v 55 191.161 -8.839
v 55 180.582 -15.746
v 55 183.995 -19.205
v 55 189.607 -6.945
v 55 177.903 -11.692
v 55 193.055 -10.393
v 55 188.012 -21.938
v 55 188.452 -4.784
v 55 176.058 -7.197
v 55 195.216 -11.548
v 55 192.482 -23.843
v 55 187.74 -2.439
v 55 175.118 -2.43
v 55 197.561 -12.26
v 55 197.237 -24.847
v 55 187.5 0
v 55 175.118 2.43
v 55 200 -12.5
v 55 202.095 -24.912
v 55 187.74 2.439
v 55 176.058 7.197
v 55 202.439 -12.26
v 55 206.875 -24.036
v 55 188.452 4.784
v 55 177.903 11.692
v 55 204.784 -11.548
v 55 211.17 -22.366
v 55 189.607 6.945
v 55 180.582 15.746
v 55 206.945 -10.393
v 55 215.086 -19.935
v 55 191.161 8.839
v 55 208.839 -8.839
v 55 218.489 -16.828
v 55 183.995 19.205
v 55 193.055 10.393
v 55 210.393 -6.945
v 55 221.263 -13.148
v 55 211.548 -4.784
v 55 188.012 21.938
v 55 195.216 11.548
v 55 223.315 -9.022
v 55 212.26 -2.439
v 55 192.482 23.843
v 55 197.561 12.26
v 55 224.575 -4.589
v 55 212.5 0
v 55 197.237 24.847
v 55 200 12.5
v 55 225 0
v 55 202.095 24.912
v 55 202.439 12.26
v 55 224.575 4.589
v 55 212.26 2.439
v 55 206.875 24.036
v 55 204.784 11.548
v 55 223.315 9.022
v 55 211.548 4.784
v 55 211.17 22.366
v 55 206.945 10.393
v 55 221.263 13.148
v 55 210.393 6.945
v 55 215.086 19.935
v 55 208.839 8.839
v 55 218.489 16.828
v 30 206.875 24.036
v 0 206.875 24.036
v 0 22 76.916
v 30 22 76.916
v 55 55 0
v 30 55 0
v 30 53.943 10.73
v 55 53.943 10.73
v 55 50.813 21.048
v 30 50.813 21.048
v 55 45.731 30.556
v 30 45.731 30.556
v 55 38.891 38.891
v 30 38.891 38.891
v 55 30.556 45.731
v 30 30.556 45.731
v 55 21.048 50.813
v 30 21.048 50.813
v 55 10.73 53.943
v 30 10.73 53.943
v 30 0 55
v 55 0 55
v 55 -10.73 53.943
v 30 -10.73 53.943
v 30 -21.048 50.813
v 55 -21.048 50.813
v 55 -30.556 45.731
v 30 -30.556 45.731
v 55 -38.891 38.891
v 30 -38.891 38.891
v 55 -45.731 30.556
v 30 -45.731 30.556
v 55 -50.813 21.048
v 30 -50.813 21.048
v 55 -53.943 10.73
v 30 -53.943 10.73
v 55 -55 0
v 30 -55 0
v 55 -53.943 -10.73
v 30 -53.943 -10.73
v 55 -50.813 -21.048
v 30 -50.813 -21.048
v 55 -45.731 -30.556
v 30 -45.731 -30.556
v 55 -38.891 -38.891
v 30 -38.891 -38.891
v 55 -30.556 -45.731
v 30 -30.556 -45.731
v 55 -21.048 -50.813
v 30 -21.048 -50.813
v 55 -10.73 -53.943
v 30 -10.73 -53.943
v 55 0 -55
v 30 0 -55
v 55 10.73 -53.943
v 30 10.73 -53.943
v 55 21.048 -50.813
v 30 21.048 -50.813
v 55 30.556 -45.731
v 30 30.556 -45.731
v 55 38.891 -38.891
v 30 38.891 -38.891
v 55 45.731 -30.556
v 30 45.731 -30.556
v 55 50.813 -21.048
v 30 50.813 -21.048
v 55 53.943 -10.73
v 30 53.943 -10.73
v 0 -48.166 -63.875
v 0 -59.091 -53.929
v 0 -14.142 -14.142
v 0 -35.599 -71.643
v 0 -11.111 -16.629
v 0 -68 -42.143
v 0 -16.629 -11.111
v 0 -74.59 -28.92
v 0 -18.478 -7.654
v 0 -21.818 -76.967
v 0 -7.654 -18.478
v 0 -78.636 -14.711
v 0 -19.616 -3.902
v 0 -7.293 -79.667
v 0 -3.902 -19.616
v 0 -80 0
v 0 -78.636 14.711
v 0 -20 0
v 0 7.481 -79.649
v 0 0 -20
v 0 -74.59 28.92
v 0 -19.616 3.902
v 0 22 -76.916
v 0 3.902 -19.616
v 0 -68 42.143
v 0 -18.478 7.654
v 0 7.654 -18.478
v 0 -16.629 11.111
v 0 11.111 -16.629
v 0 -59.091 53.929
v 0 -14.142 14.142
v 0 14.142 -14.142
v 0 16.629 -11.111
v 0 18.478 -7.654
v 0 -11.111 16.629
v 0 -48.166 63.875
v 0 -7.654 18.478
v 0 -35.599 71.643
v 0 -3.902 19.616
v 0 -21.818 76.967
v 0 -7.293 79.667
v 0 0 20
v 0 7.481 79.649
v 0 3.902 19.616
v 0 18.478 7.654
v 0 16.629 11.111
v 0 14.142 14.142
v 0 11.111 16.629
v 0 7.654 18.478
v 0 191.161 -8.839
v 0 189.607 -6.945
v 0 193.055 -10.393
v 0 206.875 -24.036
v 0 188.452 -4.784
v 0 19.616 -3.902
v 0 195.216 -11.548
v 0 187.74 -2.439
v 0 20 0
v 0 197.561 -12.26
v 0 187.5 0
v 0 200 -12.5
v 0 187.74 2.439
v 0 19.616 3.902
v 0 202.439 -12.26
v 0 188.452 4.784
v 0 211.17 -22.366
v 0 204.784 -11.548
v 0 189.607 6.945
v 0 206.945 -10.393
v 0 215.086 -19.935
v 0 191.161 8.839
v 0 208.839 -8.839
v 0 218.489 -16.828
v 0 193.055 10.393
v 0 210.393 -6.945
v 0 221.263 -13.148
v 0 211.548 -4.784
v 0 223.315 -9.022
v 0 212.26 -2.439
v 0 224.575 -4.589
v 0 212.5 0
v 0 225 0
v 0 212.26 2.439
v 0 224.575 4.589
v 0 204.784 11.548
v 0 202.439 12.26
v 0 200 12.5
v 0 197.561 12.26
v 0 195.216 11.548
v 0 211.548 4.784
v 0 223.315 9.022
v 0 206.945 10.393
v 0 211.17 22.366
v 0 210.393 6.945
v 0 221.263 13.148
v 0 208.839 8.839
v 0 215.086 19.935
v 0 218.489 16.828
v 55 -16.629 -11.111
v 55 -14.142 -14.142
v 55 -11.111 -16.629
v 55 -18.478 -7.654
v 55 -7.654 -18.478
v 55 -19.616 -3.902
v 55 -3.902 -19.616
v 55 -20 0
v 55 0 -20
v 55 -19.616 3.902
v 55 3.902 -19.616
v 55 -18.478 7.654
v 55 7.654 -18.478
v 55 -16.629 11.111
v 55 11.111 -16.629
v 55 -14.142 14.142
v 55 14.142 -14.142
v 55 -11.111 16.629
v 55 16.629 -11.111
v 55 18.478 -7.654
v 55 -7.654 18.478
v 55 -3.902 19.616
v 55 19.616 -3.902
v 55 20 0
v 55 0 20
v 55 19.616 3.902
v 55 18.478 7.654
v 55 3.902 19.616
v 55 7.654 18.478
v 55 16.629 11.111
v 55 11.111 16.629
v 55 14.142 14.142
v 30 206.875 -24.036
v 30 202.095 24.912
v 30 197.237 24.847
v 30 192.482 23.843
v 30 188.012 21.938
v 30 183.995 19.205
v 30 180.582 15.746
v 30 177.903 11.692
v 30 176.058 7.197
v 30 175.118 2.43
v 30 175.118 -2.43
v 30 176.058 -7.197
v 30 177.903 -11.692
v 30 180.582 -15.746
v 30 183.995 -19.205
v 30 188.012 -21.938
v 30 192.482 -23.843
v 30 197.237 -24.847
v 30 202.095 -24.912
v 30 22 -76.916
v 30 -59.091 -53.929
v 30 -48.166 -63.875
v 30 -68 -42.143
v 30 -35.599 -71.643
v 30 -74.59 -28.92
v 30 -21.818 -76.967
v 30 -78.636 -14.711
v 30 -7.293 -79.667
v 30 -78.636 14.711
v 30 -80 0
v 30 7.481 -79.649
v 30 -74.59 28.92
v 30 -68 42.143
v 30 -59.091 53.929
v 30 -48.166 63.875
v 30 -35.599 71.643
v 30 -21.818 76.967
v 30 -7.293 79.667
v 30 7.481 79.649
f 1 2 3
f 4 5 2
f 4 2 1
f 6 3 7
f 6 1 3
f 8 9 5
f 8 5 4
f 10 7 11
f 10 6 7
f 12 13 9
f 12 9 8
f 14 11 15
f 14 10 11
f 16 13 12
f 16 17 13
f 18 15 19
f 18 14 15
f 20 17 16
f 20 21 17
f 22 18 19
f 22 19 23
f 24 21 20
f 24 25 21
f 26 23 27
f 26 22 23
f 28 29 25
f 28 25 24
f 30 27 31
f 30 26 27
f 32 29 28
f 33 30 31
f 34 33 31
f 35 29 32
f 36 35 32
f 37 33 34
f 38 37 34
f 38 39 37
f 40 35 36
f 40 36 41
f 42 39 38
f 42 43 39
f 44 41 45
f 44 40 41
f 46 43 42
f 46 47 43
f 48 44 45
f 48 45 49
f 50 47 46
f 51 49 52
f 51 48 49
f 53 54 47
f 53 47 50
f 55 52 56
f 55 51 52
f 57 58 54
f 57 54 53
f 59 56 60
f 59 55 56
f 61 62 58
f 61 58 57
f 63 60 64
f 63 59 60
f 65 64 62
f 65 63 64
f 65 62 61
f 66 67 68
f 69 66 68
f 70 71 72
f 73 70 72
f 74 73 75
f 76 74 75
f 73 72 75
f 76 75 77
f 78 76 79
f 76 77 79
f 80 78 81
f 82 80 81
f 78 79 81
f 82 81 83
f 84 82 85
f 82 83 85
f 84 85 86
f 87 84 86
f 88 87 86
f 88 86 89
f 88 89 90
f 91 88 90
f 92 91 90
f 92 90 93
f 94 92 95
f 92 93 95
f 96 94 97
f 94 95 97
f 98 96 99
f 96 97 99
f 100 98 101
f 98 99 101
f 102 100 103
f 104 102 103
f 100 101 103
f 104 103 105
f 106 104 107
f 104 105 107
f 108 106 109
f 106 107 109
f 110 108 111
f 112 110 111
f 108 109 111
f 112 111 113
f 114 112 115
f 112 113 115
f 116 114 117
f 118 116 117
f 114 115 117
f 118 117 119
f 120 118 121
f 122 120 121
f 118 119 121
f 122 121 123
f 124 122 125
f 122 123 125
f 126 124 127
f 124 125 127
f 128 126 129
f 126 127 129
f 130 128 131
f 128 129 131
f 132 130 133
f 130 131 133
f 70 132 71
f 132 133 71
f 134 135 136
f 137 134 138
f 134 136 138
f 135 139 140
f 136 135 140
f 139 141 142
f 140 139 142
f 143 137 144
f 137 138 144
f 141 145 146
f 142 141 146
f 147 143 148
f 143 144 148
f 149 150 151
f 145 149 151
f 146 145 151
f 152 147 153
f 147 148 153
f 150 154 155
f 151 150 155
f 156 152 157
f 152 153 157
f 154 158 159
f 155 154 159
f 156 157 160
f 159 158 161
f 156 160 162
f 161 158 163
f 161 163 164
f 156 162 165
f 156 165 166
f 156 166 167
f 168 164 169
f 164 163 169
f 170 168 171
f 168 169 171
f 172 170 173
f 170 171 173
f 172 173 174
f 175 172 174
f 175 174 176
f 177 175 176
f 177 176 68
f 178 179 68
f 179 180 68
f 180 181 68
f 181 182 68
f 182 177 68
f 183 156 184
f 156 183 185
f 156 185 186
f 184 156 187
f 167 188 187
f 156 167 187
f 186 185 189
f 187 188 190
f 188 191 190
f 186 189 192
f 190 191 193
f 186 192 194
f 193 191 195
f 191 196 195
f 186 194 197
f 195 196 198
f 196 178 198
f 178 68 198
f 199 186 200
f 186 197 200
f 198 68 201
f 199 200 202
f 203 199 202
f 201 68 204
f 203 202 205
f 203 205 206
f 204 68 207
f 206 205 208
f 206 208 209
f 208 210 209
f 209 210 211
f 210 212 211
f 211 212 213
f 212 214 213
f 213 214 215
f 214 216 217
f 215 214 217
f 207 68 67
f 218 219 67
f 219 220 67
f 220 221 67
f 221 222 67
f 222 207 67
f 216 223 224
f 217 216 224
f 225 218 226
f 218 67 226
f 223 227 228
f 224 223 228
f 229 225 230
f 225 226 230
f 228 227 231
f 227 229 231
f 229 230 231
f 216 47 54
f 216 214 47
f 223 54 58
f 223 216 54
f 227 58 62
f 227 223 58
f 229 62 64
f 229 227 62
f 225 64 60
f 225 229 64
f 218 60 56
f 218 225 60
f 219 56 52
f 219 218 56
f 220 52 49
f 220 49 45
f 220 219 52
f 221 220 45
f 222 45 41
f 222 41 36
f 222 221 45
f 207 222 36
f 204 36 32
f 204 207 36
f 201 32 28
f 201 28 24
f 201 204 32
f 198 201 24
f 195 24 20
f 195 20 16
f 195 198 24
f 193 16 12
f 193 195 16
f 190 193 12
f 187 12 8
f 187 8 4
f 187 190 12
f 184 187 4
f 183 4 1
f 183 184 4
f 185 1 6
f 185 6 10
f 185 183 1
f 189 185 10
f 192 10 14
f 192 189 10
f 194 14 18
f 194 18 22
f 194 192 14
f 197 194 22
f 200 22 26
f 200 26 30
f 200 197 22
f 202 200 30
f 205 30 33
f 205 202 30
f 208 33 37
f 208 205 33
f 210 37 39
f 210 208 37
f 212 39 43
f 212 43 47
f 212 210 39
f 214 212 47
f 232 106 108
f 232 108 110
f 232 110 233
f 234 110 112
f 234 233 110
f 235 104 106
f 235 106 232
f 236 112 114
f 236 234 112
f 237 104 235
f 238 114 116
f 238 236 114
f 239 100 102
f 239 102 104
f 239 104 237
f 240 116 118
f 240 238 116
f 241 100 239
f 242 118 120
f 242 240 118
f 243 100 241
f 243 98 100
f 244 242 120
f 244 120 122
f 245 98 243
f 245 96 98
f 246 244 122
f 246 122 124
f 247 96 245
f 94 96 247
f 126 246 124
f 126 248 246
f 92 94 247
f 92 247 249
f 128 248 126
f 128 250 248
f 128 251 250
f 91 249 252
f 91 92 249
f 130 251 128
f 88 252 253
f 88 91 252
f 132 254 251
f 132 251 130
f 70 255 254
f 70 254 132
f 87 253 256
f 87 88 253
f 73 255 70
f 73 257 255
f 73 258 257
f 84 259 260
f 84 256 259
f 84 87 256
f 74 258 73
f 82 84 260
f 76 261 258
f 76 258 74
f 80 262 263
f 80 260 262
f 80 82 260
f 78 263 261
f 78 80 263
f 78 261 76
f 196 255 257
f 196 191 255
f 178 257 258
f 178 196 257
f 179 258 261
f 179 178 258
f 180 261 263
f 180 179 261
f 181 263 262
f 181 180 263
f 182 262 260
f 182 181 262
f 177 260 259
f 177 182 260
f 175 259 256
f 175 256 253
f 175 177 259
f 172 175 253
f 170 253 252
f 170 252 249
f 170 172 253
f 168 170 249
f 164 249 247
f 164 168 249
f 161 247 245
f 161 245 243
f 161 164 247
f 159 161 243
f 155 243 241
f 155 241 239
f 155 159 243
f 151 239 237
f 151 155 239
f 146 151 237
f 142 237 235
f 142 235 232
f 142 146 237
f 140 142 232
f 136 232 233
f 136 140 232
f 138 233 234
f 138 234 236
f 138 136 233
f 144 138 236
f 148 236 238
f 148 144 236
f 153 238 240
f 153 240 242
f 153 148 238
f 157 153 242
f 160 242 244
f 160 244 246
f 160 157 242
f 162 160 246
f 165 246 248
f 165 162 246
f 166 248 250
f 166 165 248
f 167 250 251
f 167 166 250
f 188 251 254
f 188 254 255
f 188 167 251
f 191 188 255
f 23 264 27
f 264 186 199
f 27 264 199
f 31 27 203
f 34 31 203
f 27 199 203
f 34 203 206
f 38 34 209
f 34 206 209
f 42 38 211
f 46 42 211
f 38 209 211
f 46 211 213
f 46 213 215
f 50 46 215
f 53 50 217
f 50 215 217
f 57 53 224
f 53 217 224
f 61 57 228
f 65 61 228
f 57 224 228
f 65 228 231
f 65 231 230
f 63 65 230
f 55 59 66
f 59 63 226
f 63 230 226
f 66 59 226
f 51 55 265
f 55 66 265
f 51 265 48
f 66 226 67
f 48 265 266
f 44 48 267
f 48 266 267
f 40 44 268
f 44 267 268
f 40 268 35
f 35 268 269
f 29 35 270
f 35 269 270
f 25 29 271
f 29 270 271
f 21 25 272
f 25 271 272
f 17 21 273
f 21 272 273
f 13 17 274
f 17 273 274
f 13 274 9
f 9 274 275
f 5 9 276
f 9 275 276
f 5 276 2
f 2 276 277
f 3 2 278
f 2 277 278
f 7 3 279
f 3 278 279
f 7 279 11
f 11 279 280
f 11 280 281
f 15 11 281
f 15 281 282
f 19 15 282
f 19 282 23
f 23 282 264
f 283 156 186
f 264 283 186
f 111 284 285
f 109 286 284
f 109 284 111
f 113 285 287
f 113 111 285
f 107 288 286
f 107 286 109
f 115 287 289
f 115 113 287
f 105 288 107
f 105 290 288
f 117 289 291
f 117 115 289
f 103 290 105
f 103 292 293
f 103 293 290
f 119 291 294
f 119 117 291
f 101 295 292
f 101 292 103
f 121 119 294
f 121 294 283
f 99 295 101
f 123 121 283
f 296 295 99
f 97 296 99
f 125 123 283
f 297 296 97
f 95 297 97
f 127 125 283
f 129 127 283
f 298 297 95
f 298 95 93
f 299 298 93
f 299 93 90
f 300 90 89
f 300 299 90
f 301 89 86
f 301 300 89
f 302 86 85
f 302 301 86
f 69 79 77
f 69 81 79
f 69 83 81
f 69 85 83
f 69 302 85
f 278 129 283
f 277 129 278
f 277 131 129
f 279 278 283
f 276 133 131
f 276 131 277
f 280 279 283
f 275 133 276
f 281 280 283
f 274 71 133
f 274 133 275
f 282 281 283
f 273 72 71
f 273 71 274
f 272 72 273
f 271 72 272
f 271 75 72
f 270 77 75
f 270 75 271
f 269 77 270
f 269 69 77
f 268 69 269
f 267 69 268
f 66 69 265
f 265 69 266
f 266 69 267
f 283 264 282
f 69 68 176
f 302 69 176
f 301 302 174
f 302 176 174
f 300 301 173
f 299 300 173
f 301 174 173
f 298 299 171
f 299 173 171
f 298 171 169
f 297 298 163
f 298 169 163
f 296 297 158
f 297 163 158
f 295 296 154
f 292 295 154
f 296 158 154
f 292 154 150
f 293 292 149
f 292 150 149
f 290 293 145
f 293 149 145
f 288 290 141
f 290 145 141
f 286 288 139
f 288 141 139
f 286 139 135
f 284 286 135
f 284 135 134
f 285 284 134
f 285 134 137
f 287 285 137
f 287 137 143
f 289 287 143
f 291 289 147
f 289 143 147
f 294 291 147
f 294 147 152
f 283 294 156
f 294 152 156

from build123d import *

# Parameters (mm, degrees)
F0_R     = 20
F0_R_2   = 12.5
F1_DEPTH = 30
F2_R     = 55
F2_R_2   = 20
F3_DEPTH = 25
F4_R     = 12.5
F5_DEPTH = 25


with BuildPart() as f1:
    # F0 (on Right) → F1 (new body)
    with BuildSketch(Plane.YZ):
        with BuildLine():
            ThreePointArc((22, -76.9155380921), (63.8748776907, -48.1663783152), (80, 0))
            ThreePointArc((80, 0), (63.8748776907, 48.1663783152), (22, 76.9155380921))
            ThreePointArc((22, 76.9155380921), (-80, 0), (22, -76.9155380921))
        make_face()
        Circle(F0_R, mode=Mode.SUBTRACT)
        with BuildLine():
            ThreePointArc((22, 76.9155380921), (63.8748776907, 48.1663783152), (80, 0))
            ThreePointArc((80, 0), (63.8748776907, -48.1663783152), (22, -76.9155380921))
            Line((22, -76.9155380921), (206.875, -24.0361056538))
            ThreePointArc((206.875, -24.0361056538), (175, 0), (206.875, 24.0361056538))
            Line((206.875, 24.0361056538), (22, 76.9155380921))
        make_face()
        with BuildLine():
            ThreePointArc((225, 0), (219.9608992783, 15.0519932235), (206.875, 24.0361056538))
            ThreePointArc((206.875, 24.0361056538), (175, 0), (206.875, -24.0361056538))
            ThreePointArc((206.875, -24.0361056538), (219.9608992783, -15.0519932235), (225, 0))
        make_face()
        with Locations((200, 0)):
            Circle(F0_R_2, mode=Mode.SUBTRACT)
    extrude(amount=F1_DEPTH)

    # F2 (on face) → F3 (join)
    with BuildSketch(Plane.YZ.offset(30)):
        Circle(F2_R)
        Circle(F2_R_2, mode=Mode.SUBTRACT)
    extrude(amount=F3_DEPTH)

    # F4 (on face) → F5 (join)
    with BuildSketch(Plane.YZ.offset(30)):
        with BuildLine():
            ThreePointArc((206.875, -24.0361056538), (219.9608992783, -15.0519932235), (225, 0))
            ThreePointArc((225, 0), (219.9608992783, 15.0519932235), (206.875, 24.0361056538))
            ThreePointArc((206.875, 24.0361056538), (175, 0), (206.875, -24.0361056538))
        make_face()
        with Locations((200, 0)):
            Circle(F4_R, mode=Mode.SUBTRACT)
    extrude(amount=F5_DEPTH)


solid = f1.part
